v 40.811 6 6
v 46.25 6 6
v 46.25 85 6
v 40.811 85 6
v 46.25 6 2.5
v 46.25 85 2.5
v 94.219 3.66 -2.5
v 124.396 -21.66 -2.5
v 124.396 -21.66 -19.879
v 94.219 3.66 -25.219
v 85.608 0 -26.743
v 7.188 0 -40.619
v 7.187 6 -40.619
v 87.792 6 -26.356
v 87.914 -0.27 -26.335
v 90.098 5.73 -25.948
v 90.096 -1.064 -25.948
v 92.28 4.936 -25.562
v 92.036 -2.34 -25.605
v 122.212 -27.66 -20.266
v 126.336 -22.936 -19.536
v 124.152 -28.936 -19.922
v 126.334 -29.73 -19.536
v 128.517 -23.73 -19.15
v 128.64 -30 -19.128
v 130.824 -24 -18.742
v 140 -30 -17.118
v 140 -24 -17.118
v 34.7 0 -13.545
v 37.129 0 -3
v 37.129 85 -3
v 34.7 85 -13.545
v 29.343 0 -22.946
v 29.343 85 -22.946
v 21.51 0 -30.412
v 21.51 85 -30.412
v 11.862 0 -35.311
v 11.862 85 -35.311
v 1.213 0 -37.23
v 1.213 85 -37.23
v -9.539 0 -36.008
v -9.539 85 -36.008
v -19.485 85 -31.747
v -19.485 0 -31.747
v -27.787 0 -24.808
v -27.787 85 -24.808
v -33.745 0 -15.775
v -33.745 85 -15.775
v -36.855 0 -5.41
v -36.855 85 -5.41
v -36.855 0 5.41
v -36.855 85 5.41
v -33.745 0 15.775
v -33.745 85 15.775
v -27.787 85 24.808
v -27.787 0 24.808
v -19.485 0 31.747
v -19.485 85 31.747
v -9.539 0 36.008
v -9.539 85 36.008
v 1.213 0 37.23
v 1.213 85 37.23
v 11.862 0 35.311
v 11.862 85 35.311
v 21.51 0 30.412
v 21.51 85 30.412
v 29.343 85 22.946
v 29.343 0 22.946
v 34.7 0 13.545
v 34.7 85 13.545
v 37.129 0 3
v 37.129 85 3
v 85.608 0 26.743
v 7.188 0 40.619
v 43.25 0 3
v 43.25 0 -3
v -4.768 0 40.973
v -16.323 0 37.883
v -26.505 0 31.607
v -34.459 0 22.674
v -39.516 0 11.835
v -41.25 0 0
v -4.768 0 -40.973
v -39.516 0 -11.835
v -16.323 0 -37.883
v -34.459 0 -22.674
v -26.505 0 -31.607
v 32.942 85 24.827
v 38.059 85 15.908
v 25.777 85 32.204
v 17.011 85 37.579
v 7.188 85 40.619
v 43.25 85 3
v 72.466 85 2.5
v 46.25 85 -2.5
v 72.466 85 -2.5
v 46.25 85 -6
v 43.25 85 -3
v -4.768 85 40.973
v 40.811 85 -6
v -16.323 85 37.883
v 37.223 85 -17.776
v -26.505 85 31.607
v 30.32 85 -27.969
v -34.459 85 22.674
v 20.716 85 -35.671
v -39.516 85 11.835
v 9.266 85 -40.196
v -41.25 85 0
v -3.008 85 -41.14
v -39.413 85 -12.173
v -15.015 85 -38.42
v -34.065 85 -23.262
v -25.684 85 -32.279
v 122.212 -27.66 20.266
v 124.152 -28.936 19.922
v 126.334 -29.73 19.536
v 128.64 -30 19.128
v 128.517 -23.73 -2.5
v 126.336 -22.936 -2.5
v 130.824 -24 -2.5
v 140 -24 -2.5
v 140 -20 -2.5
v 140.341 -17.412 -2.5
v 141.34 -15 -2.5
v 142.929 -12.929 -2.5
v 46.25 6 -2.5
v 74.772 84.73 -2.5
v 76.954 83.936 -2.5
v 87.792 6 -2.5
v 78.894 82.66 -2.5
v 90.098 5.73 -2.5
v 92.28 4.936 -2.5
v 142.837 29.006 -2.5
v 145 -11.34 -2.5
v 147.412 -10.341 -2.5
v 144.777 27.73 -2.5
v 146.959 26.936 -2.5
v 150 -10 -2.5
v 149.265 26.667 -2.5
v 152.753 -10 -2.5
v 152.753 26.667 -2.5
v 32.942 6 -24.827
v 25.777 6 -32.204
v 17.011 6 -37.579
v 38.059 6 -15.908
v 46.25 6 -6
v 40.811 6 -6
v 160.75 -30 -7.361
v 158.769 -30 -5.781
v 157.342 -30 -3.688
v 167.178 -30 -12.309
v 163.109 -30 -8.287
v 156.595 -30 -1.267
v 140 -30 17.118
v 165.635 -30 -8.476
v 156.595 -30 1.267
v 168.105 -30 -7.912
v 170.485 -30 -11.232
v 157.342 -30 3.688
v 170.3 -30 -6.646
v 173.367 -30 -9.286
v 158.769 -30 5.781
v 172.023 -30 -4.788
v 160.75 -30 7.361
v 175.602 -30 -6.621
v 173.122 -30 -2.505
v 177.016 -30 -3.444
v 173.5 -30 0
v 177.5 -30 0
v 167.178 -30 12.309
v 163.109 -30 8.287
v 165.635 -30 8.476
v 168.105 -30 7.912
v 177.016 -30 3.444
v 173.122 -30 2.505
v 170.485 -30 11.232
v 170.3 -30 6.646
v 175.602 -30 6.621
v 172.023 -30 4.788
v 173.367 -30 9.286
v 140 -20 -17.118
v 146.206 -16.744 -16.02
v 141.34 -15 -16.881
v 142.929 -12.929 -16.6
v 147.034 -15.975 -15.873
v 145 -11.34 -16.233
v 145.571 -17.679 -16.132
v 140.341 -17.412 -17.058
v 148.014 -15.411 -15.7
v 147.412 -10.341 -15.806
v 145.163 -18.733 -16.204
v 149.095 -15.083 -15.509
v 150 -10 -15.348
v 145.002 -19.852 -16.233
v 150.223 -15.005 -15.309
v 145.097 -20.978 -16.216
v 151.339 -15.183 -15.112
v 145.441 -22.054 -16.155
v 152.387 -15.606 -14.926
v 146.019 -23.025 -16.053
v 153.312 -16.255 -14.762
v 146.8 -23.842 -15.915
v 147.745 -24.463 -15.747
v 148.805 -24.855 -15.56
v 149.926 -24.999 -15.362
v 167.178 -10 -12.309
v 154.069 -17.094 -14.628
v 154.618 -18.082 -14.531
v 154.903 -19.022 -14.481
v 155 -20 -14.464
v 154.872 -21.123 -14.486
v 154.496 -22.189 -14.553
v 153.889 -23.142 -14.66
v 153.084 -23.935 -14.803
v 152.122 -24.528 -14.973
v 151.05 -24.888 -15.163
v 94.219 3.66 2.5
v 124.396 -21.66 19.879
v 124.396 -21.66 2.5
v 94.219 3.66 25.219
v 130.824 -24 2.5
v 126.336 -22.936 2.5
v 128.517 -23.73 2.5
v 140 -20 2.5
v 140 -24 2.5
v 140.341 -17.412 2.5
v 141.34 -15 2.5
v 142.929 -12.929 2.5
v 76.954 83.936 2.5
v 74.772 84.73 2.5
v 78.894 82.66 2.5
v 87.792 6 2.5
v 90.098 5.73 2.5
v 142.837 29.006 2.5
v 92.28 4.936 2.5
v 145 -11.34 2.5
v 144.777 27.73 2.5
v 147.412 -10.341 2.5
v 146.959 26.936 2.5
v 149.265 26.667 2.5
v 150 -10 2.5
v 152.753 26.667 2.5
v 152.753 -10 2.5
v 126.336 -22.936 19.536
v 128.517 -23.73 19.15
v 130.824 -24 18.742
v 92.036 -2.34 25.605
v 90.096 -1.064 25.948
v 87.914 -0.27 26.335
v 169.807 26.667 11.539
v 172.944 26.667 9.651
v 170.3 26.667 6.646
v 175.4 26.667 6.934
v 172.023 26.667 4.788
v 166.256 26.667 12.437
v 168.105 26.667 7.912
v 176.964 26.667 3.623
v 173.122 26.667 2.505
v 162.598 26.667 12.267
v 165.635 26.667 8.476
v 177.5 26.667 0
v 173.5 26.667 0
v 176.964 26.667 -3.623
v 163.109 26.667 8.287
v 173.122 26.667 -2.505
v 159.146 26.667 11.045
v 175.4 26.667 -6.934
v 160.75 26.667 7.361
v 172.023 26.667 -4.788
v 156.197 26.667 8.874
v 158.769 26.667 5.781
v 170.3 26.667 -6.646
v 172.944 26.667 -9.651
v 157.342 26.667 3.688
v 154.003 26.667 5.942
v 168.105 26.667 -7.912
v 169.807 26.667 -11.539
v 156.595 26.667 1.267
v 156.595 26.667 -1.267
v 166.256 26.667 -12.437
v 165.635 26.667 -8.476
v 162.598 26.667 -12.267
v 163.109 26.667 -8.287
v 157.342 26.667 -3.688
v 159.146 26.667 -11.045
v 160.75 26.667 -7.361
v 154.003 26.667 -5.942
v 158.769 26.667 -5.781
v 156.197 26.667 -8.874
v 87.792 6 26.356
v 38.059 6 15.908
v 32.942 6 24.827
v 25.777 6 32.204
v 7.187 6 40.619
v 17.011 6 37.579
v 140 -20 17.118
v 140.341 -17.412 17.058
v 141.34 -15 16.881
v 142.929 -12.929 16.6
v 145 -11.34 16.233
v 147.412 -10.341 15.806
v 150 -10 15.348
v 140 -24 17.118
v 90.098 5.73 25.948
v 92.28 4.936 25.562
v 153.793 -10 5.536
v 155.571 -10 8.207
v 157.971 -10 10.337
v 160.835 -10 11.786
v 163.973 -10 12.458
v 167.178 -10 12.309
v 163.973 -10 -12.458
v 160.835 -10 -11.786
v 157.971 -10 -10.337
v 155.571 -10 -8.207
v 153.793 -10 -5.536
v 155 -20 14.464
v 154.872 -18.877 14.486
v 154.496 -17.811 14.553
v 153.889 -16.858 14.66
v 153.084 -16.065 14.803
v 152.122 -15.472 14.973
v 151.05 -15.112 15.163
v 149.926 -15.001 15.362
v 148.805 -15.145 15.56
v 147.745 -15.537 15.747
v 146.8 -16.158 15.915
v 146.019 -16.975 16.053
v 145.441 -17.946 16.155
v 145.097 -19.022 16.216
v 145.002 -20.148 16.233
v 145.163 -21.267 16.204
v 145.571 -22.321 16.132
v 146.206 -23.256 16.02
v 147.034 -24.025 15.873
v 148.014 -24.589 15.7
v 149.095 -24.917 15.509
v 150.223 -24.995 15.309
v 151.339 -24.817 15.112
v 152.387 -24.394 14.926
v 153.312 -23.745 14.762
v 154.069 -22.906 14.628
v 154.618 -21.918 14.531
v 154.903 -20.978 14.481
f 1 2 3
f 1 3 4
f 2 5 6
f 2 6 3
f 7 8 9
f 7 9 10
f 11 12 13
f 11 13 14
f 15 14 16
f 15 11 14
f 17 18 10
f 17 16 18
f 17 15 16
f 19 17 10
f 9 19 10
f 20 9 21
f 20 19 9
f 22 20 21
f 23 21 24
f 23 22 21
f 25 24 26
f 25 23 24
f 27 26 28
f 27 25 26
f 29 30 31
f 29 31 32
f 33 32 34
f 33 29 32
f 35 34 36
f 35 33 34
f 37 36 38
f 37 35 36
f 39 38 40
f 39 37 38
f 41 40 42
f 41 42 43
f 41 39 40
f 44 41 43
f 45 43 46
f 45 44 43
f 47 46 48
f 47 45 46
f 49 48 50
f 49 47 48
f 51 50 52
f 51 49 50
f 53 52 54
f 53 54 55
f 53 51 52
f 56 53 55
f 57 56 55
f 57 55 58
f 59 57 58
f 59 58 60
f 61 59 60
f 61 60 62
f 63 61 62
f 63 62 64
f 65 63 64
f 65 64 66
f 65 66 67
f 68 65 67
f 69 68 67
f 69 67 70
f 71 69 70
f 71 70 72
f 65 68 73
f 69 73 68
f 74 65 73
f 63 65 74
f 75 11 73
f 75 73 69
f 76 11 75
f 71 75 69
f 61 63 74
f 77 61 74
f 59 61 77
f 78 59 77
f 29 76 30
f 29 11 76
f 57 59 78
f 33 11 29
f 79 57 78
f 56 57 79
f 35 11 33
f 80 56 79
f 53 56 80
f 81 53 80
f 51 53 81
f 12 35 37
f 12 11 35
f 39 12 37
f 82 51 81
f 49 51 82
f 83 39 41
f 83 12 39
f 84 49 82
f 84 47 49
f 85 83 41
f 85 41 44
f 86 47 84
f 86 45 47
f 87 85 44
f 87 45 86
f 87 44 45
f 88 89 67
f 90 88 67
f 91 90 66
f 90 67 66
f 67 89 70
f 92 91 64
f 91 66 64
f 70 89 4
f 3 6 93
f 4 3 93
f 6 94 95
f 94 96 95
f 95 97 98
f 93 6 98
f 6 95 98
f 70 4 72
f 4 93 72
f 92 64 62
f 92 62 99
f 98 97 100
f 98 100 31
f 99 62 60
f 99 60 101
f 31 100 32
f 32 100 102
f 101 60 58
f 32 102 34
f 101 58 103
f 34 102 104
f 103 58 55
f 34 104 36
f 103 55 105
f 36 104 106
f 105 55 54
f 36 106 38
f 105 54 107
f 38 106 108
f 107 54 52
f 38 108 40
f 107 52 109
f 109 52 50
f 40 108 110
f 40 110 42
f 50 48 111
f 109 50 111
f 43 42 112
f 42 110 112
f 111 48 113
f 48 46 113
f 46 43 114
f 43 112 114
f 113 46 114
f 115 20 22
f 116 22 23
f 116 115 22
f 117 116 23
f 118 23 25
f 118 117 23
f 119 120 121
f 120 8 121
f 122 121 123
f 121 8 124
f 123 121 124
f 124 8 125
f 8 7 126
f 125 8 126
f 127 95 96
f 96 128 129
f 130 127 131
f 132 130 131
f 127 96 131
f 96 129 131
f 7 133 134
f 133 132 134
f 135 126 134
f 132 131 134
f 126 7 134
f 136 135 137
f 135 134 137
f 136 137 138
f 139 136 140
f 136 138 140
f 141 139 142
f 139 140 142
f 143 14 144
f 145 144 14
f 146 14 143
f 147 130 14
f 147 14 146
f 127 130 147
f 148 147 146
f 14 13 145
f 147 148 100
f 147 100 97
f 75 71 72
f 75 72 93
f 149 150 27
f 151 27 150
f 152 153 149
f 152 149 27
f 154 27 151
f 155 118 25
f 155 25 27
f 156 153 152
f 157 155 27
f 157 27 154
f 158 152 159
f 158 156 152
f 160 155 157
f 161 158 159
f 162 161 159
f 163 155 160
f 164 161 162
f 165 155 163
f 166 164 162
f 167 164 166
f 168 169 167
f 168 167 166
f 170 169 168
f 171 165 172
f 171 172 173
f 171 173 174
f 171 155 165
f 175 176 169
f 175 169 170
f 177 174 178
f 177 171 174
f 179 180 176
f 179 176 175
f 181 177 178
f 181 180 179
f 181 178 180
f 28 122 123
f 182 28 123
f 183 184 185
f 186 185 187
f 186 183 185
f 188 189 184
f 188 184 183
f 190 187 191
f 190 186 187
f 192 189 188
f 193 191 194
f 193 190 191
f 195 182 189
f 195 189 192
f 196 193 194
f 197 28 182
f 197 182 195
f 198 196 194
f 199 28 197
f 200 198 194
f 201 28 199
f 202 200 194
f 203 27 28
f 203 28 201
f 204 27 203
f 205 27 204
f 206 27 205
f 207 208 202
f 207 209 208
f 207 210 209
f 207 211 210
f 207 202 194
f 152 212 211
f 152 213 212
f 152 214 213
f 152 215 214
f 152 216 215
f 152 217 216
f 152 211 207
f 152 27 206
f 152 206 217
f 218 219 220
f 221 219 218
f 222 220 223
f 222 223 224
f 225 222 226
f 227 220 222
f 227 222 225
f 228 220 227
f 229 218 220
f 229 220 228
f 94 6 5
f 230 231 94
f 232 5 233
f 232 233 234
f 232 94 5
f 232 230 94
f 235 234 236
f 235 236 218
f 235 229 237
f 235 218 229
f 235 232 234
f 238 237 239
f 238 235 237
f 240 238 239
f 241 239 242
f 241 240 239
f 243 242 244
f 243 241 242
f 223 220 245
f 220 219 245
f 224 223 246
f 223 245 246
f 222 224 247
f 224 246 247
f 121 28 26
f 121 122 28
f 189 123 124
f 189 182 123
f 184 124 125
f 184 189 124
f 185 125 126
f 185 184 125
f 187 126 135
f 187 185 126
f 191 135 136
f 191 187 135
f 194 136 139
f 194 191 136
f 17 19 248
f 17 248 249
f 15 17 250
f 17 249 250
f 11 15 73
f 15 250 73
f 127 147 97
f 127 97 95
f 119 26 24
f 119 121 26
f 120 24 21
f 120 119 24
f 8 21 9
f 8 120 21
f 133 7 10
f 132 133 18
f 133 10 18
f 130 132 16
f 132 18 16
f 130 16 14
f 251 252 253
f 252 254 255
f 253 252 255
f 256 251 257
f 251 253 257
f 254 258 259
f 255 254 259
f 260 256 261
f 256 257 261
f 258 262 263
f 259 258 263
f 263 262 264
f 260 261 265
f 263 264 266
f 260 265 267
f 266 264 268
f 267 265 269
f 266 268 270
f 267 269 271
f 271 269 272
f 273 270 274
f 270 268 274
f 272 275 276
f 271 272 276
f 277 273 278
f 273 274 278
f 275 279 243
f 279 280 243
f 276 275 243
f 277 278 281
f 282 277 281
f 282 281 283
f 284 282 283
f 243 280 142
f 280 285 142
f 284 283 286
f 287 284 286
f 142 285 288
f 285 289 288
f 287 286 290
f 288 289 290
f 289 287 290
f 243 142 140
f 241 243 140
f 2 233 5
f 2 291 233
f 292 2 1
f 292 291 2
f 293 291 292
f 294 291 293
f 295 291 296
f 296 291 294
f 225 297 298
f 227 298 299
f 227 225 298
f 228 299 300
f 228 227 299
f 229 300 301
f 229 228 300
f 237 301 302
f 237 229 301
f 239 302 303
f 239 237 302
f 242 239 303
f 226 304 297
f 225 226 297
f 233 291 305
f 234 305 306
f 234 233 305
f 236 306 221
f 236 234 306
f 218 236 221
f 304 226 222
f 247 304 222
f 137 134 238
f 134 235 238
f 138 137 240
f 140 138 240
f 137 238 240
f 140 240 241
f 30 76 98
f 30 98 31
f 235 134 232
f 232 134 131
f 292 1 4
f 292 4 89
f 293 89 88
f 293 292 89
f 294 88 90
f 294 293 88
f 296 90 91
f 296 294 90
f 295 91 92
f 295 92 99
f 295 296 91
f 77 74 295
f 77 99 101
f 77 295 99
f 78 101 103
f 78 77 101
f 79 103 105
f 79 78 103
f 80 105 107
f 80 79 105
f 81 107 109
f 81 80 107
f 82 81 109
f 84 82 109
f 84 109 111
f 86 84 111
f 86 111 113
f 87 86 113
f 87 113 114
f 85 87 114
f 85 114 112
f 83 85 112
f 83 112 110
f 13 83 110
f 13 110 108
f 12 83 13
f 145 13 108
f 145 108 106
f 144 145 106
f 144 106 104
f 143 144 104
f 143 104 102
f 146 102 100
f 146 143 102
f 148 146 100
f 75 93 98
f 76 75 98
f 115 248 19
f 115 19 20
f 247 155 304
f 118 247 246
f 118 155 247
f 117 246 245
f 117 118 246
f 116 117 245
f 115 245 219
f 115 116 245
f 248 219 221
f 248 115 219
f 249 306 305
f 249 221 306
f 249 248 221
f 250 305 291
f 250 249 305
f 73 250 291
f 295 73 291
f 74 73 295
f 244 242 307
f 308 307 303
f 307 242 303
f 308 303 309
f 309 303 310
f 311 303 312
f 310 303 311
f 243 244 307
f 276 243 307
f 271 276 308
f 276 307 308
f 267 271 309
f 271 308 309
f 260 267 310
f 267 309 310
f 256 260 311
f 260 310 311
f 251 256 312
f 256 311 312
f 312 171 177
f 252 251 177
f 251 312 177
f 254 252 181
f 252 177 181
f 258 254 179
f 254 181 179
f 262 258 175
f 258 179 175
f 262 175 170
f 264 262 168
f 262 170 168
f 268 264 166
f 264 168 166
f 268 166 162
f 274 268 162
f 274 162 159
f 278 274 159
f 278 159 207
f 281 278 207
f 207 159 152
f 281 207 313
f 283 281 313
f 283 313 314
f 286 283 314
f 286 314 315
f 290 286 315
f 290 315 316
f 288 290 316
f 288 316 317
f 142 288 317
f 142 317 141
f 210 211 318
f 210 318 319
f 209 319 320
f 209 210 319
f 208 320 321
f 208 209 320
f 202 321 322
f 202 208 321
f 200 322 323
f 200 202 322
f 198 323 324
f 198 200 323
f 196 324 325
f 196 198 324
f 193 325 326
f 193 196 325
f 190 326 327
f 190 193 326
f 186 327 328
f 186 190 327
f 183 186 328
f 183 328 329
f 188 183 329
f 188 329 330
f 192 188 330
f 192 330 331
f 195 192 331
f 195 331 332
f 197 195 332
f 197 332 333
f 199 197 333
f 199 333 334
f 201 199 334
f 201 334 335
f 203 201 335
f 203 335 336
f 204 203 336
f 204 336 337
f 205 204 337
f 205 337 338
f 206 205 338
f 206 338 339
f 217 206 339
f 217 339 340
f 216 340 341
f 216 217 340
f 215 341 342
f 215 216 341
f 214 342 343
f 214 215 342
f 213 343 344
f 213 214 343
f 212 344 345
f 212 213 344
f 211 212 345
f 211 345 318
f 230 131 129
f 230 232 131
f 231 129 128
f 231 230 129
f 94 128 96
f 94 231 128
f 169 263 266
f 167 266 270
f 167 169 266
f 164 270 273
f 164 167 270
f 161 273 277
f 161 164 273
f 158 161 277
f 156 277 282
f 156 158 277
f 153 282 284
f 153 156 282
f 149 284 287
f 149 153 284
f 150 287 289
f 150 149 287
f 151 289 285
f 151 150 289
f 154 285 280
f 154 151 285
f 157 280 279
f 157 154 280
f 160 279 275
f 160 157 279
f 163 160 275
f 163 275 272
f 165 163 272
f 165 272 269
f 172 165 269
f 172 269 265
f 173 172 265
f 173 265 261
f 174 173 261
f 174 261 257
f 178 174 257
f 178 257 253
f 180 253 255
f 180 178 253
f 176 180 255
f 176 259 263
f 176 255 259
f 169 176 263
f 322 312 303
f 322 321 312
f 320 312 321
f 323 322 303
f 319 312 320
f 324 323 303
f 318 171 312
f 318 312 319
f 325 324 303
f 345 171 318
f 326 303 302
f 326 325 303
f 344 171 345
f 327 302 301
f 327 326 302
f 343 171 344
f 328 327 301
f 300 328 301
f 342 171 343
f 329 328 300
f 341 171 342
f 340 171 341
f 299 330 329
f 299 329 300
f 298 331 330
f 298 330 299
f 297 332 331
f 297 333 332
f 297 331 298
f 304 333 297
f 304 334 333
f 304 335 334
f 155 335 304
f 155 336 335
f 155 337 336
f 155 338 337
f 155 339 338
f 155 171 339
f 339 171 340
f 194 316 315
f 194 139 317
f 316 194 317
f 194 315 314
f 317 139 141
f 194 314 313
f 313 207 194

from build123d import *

# Parameters (mm, degrees)
BOSS_EXTRUDE1_DEPTH     = 85
BOSS_EXTRUDE2_START     = -30
SKETCH2_3_R             = 12.5
BOSS_EXTRUDE2_DEPTH     = 56.666666667
EXTRUDE_THIN1_DEPTH     = 115
SKETCH5_W               = 50
SKETCH5_H               = 20
BOSS_EXTRUDE3_DEPTH     = 230
CUT_EXTRUDE2_DEPTH      = 311.201547385
CUT_EXTRUDE2_DEPTH_BACK = 311.201547385
SKETCH5_3_R             = 5
CUT_EXTRUDE1_START      = -30
CUT_EXTRUDE1_OUTLINE_R  = 8.5
CUT_EXTRUDE1_DEPTH      = 115
RIB1_START              = -2.5
RIB1_DEPTH              = 5
FILLET1_R               = 10


# Read off the part's stored shape, not the designer's step: Cut-Extrude1, Rib1
with BuildPart() as part:
    # Sketch2 → Boss-Extrude1 (new body)
    with BuildSketch(Plane(origin=(0, 0, 0), x_dir=(1, 0, 0), z_dir=(0, 1, 0))):
        with BuildLine():
            Line((40.811303581, 6), (46.25, 6))
            Line((46.25, 6), (46.25, -6))
            Line((46.25, -6), (40.811303581, -6))
            ThreePointArc((40.811303581, -6), (-41.25, 0), (40.811303581, 6))
        make_face()
    extrude(amount=BOSS_EXTRUDE1_DEPTH)



with BuildPart() as body_2:
    # Sketch2<3> → Boss-Extrude2 (new body)
    with BuildSketch(Plane(origin=(0, 0, 0), x_dir=(1, 0, 0), z_dir=(0, 1, 0)).offset(BOSS_EXTRUDE2_START)):
        with Locations(Location((165, 0, 0), (0, 0, 270))):
            Circle(SKETCH2_3_R)
    extrude(amount=BOSS_EXTRUDE2_DEPTH)


with BuildPart() as part_1:
    add(part.part)

    add(body_2.part)  # Extrude-Thin1 merges body 2
    # Sketch3 → Extrude-Thin1 (add, symmetric)
    with BuildSketch(Plane.XY):
        Polygon((-41.25, 0), (89.247392222, 0), (125, -30), (177.5, -30), (177.5, -24), (127.183821406, -24), (91.431213628, 6), (-41.25, 6), align=None)
    extrude(amount=EXTRUDE_THIN1_DEPTH, both=True)

    # Sketch5 → Boss-Extrude3 (add)
    with BuildSketch(Plane.XY.offset(115)):
        with Locations((165, -20)):
            Rectangle(SKETCH5_W, SKETCH5_H)
    extrude(amount=-BOSS_EXTRUDE3_DEPTH)

    # Sketch5<3> → Cut-Extrude2 (cut, two sides: drawn at the far end of the back side and taken through both)
    with BuildSketch(Plane.XY.offset(115).offset(-CUT_EXTRUDE2_DEPTH_BACK)):
        with Locations((150, -20)):
            Circle(SKETCH5_3_R)
    extrude(amount=CUT_EXTRUDE2_DEPTH + CUT_EXTRUDE2_DEPTH_BACK, mode=Mode.SUBTRACT)

    # Cut-Extrude1 outline → Cut-Extrude1 (cut)
    with BuildSketch(Plane(origin=(0, 0, 0), x_dir=(1, 0, 0), z_dir=(0, 1, 0)).offset(CUT_EXTRUDE1_START)):
        with BuildLine():
            ThreePointArc((167.178030303, 12.30878483), (174.5779794, 8.03195559), (177.5, 0))
            ThreePointArc((177.5, 0), (174.5779794, -8.03195559), (167.178030303, -12.30878483))
            Line((167.178030303, -12.30878483), (140, -17.117917039))
            Line((140, -17.117917039), (140, -115))
            Line((140, -115), (190, -115))
            Line((190, -115), (190, 115))
            Line((190, 115), (140, 115))
            Line((140, 115), (140, 17.117917039))
            Line((140, 17.117917039), (167.178030303, 12.30878483))
        make_face()
        with BuildLine():
            Line((7.1875, 40.61898994), (140, 17.117917039))
            Line((140, 17.117917039), (140, 115))
            Line((140, 115), (-41.25, 115))
            Line((-41.25, 115), (-41.25, -8.8e-08))
            ThreePointArc((-41.25, -8.8e-08), (-26.505453482, 31.607331993), (7.1875, 40.61898994))
        make_face()
        with BuildLine():
            Line((140, -115), (140, -17.117917039))
            Line((140, -17.117917039), (7.1875, -40.61898994))
            ThreePointArc((7.1875, -40.61898994), (-26.505453415, -31.607332049), (-41.25, -8.8e-08))
            Line((-41.25, -8.8e-08), (-41.25, -115))
            Line((-41.25, -115), (140, -115))
        make_face()
        with Locations((165, 0)):
            Circle(CUT_EXTRUDE1_OUTLINE_R)
        with BuildLine():
            Line((43.25, 3), (37.128998101, 3))
            ThreePointArc((37.128998101, 3), (-37.25, 0), (37.128998101, -3))
            Line((37.128998101, -3), (43.25, -3))
            Line((43.25, -3), (43.25, 3))
        make_face()
    extrude(amount=CUT_EXTRUDE1_DEPTH, mode=Mode.SUBTRACT)

    # Rib1 outline → Rib1 (add)
    with BuildSketch(Plane.XY.offset(RIB1_START)):
        Polygon((145.624979942, 26.666666667), (76.106020374, 85), (46.25, 85), (46.25, 6), (91.431213628, 6), (127.183821406, -24), (140, -24), (140, -10), (154, -10), (154, 26.666666667), align=None)
    extrude(amount=RIB1_DEPTH)

    # Fillet1
    fillet1_edges = [part_1.edges().sort_by_distance(p)[0] for p in [
        (140, -10, 9.80895852),
        (127.183821406, -24, -10.942865145),
        (91.431213628, 6, -14.106063797),
        (145.624979942, 26.666666667, 0),
        (76.106020374, 85, 0),
        (140, -10, -9.808958519),
        (89.247392222, 0, 0),
        (91.431213628, 6, 14.106063797),
        (127.183821406, -24, 10.942865145),
        (125, -30, 0),
    ]]
    fillet(fillet1_edges, radius=FILLET1_R)


solid = part_1.part
